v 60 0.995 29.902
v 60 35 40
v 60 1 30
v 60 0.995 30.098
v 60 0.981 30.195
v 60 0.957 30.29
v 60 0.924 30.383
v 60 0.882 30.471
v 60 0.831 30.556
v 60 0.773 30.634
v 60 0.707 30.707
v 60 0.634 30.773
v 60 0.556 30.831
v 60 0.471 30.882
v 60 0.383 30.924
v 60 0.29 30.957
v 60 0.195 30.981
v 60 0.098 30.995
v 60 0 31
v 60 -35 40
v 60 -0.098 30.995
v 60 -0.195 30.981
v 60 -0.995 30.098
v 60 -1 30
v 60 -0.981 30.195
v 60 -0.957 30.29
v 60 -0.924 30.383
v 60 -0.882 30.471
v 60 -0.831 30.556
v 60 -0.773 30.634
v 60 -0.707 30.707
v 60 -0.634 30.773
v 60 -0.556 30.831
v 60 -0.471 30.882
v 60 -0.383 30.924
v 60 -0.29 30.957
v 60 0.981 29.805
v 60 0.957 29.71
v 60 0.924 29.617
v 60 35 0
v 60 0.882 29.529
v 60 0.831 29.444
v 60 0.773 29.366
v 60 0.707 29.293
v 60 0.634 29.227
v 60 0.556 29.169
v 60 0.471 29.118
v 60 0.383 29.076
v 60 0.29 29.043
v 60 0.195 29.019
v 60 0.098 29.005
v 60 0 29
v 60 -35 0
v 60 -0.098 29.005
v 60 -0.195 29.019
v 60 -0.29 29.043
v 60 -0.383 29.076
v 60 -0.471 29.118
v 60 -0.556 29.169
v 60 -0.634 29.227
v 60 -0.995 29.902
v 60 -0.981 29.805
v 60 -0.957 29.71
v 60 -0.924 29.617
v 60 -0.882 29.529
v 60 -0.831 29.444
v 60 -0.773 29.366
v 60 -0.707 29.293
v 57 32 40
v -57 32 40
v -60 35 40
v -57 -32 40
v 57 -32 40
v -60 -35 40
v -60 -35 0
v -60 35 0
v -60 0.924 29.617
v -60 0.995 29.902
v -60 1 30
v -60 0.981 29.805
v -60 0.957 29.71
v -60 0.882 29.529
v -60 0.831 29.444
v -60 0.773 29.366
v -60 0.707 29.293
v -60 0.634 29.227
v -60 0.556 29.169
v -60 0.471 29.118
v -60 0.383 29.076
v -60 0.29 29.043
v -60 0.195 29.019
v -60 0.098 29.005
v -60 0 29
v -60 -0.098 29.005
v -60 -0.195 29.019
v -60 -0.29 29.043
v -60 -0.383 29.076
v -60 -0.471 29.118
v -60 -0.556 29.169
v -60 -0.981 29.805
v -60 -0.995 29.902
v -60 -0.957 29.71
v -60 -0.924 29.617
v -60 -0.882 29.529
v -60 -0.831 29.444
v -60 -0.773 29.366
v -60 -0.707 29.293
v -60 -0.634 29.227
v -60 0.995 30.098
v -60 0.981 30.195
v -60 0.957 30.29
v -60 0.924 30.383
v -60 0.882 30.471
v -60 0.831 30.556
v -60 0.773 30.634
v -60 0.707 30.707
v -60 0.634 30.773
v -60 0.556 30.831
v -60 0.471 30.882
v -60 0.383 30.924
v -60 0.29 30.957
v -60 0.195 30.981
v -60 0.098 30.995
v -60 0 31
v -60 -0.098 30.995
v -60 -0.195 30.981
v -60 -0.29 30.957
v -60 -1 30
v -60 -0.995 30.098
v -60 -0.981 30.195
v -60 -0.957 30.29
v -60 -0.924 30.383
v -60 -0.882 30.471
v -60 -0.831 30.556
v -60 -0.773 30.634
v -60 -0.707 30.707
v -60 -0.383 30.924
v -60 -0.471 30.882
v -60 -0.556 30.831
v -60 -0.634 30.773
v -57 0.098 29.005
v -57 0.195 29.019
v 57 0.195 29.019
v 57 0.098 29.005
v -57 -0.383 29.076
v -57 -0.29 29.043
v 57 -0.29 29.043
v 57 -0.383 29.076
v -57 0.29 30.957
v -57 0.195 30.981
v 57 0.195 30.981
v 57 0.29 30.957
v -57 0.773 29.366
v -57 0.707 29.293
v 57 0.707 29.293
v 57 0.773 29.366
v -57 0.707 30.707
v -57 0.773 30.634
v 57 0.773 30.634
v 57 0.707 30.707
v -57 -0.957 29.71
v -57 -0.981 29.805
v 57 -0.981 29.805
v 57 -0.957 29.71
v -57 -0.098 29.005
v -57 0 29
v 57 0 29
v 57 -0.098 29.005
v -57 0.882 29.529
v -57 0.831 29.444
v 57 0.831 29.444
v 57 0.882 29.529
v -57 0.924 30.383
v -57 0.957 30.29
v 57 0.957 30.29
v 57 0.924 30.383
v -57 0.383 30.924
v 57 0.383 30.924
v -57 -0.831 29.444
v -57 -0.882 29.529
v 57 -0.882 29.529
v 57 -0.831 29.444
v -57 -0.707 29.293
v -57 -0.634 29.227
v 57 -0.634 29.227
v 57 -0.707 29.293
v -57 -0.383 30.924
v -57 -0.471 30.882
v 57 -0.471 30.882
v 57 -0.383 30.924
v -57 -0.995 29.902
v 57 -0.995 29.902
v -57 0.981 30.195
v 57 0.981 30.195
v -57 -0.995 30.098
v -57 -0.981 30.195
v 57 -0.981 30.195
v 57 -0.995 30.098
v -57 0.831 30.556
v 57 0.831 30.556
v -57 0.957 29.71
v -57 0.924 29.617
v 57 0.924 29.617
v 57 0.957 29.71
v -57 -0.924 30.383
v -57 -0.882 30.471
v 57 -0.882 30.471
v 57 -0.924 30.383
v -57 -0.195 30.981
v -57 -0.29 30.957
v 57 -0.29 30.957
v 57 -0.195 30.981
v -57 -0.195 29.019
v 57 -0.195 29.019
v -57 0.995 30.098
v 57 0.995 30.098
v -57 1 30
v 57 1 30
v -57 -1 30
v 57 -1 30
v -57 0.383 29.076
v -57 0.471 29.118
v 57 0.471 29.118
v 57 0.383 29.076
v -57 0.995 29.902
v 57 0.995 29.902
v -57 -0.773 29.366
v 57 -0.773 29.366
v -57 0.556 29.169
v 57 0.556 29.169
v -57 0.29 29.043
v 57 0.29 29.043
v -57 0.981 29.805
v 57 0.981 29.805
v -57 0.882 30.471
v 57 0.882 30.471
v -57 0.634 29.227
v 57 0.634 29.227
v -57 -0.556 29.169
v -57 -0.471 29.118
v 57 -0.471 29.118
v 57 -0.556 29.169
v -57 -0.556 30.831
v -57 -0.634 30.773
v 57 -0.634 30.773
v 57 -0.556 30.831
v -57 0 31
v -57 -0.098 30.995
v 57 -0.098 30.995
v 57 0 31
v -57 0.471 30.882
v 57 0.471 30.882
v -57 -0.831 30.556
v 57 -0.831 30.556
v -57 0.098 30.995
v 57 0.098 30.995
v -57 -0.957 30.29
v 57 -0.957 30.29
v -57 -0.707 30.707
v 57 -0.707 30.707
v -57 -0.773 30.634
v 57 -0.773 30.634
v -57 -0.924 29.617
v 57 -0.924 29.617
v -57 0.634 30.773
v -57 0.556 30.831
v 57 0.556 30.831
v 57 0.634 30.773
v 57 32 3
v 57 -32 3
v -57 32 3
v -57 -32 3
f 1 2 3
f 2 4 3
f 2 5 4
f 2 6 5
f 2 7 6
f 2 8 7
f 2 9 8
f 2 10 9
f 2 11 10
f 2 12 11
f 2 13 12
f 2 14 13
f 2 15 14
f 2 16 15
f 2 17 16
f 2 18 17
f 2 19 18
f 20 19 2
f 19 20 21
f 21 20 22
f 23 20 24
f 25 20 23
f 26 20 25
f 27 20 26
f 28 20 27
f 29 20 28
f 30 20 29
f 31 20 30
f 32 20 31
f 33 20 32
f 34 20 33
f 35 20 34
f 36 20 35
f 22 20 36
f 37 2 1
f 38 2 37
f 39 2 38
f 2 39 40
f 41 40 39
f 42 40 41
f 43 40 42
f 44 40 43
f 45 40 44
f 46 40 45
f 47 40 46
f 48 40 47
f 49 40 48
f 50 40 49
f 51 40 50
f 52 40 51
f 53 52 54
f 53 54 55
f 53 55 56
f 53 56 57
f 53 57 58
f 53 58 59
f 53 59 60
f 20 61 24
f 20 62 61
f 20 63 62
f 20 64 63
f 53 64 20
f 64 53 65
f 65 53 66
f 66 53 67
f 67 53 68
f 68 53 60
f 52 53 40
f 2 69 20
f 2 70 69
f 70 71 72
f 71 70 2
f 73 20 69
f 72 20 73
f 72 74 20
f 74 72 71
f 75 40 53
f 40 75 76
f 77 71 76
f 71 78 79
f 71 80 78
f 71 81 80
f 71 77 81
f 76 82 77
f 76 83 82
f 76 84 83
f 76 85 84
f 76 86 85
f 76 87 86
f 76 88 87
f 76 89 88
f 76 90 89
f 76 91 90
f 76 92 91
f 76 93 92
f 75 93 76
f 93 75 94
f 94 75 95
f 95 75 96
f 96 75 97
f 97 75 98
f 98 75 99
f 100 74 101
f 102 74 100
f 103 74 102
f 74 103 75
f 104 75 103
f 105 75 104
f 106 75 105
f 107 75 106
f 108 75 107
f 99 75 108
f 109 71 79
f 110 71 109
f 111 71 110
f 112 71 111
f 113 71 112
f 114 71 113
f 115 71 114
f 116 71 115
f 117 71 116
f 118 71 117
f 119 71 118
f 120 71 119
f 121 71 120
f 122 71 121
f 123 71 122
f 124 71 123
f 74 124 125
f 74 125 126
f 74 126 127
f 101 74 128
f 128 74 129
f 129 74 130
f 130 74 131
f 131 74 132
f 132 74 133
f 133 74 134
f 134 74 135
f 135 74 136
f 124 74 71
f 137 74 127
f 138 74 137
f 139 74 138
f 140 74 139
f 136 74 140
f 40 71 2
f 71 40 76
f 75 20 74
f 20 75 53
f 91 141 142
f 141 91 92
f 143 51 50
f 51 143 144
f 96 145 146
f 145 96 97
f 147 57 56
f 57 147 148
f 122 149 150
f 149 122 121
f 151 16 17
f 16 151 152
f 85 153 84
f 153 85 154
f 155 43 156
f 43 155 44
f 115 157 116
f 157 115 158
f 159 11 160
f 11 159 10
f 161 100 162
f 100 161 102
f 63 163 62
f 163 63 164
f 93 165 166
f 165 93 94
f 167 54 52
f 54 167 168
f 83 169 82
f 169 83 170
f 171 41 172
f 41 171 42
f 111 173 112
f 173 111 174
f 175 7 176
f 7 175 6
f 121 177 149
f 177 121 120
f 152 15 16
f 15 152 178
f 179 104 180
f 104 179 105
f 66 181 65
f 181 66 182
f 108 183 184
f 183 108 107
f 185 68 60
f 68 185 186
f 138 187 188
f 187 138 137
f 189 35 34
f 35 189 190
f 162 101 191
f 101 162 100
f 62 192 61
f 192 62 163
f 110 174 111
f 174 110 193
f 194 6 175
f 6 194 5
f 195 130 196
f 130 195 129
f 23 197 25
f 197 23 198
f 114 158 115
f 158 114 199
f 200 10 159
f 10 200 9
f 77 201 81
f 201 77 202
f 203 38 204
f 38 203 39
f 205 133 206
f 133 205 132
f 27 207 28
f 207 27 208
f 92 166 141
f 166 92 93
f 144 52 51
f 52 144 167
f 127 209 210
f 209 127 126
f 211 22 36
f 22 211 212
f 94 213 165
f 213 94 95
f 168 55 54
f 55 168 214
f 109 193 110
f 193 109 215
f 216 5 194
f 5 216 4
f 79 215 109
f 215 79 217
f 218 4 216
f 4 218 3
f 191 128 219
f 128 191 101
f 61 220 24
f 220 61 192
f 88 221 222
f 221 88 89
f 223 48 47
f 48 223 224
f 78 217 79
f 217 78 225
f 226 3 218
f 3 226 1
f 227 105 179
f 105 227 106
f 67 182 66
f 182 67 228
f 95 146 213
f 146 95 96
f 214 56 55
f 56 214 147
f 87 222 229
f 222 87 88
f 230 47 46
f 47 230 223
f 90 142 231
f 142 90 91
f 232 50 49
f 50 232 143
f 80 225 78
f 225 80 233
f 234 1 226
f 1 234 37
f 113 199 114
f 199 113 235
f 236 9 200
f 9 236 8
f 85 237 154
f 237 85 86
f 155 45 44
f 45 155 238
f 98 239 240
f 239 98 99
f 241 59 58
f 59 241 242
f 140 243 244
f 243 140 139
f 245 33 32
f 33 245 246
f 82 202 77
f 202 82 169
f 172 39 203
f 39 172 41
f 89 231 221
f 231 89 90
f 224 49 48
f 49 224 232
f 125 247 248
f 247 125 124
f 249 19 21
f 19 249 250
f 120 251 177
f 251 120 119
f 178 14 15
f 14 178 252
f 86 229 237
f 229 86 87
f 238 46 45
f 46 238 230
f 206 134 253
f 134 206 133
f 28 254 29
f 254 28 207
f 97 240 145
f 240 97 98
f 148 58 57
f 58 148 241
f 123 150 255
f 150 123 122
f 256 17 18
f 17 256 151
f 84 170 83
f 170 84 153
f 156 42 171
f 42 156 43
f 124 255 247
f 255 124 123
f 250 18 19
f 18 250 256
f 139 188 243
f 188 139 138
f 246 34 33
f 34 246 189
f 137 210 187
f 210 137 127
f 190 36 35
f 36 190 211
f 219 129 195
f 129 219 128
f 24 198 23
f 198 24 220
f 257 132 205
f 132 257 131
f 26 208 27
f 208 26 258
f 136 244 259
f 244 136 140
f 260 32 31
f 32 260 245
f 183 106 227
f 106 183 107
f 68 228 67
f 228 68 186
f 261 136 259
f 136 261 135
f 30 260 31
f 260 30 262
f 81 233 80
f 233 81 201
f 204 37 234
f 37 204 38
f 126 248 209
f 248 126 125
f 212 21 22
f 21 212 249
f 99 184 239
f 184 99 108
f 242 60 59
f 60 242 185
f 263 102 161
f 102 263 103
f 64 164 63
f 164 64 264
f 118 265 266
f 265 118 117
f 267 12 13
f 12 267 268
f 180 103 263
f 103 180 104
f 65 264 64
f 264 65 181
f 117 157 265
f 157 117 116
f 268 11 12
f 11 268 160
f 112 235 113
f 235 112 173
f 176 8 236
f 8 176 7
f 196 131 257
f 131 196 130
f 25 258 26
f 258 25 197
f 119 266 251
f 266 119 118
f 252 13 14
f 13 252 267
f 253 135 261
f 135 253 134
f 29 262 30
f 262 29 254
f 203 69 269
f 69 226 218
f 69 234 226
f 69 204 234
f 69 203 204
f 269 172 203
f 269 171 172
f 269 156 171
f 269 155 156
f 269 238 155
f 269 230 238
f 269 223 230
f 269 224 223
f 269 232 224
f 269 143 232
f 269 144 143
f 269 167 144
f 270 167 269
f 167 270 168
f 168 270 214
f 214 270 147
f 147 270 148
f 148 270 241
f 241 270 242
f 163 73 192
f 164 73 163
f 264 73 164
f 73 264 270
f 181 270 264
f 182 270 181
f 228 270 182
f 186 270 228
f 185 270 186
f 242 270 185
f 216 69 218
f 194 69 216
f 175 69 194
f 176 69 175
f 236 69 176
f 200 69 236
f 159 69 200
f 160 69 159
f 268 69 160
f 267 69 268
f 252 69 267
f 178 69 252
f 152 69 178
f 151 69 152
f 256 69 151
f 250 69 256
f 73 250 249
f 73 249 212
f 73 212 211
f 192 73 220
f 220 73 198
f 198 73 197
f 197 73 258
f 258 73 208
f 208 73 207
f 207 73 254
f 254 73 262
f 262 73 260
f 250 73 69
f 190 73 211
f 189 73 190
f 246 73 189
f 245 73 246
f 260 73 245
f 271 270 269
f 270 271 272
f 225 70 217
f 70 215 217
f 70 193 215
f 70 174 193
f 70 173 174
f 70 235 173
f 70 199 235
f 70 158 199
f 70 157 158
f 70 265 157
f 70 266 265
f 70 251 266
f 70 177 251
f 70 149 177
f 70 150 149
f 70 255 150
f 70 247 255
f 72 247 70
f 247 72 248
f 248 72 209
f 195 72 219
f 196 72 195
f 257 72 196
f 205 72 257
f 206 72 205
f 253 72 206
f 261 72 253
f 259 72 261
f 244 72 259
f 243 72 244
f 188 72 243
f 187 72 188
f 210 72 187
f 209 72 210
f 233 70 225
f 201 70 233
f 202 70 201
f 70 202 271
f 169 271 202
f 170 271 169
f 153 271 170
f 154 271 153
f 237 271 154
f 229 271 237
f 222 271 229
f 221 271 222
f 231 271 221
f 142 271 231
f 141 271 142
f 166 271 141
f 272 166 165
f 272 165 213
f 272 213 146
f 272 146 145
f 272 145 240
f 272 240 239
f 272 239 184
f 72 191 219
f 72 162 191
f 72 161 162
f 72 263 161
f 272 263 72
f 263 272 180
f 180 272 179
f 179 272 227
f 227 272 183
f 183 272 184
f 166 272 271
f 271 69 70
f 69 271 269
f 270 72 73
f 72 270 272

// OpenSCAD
// Buffer tank for a mini horizontal gel-electrophoresis box
// Print orientation: rests on XY plane at z = 0, builds upward (+Z), centred on origin in X and Y.

// ---- Outer tank dimensions (measured with calipers) ----
outer_x = 120;   // tank length along X
outer_y = 70;    // tank width  along Y
outer_z = 40;    // tank height along Z

// ---- Wall / floor thickness ----
wall_t = 3;      // side wall thickness
floor_t = 3;     // floor thickness

// ---- Inner cavity (open top) ----
inner_x = outer_x - 2 * wall_t;   // 114 mm
inner_y = outer_y - 2 * wall_t;   // 64 mm
inner_z = outer_z - floor_t;      // 37 mm (open top)

// ---- Raised gel-tray platform ----
plat_len = 60;   // platform length along X (centred)
plat_top = 13;   // platform top height above z = 0 (10 mm above inner floor at z = 3)
plat_h   = plat_top - floor_t;    // 10 mm above the floor

// ---- Electrode-wire holes (through the two X end walls) ----
hole_d = 2;      // hole diameter
hole_y = 0;      // centred in Y
hole_z = 30;     // height above z = 0

$fn = 64;        // round holes / cylinders

// ---- 1. Solid outer block ----
module block() { translate([-outer_x/2, -outer_y/2, 0])
        cube([outer_x, outer_y, outer_z]); }

// ---- 2. Open-top inner cavity (cut 1 mm past the top so the top stays open) ----
module cavity() { translate([-(inner_x/2), -(inner_y/2), floor_t])
        cube([inner_x, inner_y, inner_z + 1]); }

// ---- 3. Raised gel-tray platform (solid, spans full inner width, centred in X) ----
module platform() { translate([-(plat_len/2), -(inner_y/2), floor_t])
          cube([plat_len, inner_y, plat_h]); }

// ---- 4. Electrode-wire holes: horizontal cylinders along X through both end walls ----
//      Each cylinder extends 1 mm past the outer face of the wall it passes through,
//      so the cut is not coplanar with any face.
module wire_hole() { cylinder(h = outer_x + 2, r = hole_d/2, $fn = $fn); }

// ---- Assemble ----
difference() {
    union() {
        block();
        platform();
    }
    cavity();
    for (x_end = [-1, 1]) {
        translate([x_end * outer_x/2 - 1, hole_y, hole_z])
            rotate([0, 90, 0])
            wire_hole();
    }
}
